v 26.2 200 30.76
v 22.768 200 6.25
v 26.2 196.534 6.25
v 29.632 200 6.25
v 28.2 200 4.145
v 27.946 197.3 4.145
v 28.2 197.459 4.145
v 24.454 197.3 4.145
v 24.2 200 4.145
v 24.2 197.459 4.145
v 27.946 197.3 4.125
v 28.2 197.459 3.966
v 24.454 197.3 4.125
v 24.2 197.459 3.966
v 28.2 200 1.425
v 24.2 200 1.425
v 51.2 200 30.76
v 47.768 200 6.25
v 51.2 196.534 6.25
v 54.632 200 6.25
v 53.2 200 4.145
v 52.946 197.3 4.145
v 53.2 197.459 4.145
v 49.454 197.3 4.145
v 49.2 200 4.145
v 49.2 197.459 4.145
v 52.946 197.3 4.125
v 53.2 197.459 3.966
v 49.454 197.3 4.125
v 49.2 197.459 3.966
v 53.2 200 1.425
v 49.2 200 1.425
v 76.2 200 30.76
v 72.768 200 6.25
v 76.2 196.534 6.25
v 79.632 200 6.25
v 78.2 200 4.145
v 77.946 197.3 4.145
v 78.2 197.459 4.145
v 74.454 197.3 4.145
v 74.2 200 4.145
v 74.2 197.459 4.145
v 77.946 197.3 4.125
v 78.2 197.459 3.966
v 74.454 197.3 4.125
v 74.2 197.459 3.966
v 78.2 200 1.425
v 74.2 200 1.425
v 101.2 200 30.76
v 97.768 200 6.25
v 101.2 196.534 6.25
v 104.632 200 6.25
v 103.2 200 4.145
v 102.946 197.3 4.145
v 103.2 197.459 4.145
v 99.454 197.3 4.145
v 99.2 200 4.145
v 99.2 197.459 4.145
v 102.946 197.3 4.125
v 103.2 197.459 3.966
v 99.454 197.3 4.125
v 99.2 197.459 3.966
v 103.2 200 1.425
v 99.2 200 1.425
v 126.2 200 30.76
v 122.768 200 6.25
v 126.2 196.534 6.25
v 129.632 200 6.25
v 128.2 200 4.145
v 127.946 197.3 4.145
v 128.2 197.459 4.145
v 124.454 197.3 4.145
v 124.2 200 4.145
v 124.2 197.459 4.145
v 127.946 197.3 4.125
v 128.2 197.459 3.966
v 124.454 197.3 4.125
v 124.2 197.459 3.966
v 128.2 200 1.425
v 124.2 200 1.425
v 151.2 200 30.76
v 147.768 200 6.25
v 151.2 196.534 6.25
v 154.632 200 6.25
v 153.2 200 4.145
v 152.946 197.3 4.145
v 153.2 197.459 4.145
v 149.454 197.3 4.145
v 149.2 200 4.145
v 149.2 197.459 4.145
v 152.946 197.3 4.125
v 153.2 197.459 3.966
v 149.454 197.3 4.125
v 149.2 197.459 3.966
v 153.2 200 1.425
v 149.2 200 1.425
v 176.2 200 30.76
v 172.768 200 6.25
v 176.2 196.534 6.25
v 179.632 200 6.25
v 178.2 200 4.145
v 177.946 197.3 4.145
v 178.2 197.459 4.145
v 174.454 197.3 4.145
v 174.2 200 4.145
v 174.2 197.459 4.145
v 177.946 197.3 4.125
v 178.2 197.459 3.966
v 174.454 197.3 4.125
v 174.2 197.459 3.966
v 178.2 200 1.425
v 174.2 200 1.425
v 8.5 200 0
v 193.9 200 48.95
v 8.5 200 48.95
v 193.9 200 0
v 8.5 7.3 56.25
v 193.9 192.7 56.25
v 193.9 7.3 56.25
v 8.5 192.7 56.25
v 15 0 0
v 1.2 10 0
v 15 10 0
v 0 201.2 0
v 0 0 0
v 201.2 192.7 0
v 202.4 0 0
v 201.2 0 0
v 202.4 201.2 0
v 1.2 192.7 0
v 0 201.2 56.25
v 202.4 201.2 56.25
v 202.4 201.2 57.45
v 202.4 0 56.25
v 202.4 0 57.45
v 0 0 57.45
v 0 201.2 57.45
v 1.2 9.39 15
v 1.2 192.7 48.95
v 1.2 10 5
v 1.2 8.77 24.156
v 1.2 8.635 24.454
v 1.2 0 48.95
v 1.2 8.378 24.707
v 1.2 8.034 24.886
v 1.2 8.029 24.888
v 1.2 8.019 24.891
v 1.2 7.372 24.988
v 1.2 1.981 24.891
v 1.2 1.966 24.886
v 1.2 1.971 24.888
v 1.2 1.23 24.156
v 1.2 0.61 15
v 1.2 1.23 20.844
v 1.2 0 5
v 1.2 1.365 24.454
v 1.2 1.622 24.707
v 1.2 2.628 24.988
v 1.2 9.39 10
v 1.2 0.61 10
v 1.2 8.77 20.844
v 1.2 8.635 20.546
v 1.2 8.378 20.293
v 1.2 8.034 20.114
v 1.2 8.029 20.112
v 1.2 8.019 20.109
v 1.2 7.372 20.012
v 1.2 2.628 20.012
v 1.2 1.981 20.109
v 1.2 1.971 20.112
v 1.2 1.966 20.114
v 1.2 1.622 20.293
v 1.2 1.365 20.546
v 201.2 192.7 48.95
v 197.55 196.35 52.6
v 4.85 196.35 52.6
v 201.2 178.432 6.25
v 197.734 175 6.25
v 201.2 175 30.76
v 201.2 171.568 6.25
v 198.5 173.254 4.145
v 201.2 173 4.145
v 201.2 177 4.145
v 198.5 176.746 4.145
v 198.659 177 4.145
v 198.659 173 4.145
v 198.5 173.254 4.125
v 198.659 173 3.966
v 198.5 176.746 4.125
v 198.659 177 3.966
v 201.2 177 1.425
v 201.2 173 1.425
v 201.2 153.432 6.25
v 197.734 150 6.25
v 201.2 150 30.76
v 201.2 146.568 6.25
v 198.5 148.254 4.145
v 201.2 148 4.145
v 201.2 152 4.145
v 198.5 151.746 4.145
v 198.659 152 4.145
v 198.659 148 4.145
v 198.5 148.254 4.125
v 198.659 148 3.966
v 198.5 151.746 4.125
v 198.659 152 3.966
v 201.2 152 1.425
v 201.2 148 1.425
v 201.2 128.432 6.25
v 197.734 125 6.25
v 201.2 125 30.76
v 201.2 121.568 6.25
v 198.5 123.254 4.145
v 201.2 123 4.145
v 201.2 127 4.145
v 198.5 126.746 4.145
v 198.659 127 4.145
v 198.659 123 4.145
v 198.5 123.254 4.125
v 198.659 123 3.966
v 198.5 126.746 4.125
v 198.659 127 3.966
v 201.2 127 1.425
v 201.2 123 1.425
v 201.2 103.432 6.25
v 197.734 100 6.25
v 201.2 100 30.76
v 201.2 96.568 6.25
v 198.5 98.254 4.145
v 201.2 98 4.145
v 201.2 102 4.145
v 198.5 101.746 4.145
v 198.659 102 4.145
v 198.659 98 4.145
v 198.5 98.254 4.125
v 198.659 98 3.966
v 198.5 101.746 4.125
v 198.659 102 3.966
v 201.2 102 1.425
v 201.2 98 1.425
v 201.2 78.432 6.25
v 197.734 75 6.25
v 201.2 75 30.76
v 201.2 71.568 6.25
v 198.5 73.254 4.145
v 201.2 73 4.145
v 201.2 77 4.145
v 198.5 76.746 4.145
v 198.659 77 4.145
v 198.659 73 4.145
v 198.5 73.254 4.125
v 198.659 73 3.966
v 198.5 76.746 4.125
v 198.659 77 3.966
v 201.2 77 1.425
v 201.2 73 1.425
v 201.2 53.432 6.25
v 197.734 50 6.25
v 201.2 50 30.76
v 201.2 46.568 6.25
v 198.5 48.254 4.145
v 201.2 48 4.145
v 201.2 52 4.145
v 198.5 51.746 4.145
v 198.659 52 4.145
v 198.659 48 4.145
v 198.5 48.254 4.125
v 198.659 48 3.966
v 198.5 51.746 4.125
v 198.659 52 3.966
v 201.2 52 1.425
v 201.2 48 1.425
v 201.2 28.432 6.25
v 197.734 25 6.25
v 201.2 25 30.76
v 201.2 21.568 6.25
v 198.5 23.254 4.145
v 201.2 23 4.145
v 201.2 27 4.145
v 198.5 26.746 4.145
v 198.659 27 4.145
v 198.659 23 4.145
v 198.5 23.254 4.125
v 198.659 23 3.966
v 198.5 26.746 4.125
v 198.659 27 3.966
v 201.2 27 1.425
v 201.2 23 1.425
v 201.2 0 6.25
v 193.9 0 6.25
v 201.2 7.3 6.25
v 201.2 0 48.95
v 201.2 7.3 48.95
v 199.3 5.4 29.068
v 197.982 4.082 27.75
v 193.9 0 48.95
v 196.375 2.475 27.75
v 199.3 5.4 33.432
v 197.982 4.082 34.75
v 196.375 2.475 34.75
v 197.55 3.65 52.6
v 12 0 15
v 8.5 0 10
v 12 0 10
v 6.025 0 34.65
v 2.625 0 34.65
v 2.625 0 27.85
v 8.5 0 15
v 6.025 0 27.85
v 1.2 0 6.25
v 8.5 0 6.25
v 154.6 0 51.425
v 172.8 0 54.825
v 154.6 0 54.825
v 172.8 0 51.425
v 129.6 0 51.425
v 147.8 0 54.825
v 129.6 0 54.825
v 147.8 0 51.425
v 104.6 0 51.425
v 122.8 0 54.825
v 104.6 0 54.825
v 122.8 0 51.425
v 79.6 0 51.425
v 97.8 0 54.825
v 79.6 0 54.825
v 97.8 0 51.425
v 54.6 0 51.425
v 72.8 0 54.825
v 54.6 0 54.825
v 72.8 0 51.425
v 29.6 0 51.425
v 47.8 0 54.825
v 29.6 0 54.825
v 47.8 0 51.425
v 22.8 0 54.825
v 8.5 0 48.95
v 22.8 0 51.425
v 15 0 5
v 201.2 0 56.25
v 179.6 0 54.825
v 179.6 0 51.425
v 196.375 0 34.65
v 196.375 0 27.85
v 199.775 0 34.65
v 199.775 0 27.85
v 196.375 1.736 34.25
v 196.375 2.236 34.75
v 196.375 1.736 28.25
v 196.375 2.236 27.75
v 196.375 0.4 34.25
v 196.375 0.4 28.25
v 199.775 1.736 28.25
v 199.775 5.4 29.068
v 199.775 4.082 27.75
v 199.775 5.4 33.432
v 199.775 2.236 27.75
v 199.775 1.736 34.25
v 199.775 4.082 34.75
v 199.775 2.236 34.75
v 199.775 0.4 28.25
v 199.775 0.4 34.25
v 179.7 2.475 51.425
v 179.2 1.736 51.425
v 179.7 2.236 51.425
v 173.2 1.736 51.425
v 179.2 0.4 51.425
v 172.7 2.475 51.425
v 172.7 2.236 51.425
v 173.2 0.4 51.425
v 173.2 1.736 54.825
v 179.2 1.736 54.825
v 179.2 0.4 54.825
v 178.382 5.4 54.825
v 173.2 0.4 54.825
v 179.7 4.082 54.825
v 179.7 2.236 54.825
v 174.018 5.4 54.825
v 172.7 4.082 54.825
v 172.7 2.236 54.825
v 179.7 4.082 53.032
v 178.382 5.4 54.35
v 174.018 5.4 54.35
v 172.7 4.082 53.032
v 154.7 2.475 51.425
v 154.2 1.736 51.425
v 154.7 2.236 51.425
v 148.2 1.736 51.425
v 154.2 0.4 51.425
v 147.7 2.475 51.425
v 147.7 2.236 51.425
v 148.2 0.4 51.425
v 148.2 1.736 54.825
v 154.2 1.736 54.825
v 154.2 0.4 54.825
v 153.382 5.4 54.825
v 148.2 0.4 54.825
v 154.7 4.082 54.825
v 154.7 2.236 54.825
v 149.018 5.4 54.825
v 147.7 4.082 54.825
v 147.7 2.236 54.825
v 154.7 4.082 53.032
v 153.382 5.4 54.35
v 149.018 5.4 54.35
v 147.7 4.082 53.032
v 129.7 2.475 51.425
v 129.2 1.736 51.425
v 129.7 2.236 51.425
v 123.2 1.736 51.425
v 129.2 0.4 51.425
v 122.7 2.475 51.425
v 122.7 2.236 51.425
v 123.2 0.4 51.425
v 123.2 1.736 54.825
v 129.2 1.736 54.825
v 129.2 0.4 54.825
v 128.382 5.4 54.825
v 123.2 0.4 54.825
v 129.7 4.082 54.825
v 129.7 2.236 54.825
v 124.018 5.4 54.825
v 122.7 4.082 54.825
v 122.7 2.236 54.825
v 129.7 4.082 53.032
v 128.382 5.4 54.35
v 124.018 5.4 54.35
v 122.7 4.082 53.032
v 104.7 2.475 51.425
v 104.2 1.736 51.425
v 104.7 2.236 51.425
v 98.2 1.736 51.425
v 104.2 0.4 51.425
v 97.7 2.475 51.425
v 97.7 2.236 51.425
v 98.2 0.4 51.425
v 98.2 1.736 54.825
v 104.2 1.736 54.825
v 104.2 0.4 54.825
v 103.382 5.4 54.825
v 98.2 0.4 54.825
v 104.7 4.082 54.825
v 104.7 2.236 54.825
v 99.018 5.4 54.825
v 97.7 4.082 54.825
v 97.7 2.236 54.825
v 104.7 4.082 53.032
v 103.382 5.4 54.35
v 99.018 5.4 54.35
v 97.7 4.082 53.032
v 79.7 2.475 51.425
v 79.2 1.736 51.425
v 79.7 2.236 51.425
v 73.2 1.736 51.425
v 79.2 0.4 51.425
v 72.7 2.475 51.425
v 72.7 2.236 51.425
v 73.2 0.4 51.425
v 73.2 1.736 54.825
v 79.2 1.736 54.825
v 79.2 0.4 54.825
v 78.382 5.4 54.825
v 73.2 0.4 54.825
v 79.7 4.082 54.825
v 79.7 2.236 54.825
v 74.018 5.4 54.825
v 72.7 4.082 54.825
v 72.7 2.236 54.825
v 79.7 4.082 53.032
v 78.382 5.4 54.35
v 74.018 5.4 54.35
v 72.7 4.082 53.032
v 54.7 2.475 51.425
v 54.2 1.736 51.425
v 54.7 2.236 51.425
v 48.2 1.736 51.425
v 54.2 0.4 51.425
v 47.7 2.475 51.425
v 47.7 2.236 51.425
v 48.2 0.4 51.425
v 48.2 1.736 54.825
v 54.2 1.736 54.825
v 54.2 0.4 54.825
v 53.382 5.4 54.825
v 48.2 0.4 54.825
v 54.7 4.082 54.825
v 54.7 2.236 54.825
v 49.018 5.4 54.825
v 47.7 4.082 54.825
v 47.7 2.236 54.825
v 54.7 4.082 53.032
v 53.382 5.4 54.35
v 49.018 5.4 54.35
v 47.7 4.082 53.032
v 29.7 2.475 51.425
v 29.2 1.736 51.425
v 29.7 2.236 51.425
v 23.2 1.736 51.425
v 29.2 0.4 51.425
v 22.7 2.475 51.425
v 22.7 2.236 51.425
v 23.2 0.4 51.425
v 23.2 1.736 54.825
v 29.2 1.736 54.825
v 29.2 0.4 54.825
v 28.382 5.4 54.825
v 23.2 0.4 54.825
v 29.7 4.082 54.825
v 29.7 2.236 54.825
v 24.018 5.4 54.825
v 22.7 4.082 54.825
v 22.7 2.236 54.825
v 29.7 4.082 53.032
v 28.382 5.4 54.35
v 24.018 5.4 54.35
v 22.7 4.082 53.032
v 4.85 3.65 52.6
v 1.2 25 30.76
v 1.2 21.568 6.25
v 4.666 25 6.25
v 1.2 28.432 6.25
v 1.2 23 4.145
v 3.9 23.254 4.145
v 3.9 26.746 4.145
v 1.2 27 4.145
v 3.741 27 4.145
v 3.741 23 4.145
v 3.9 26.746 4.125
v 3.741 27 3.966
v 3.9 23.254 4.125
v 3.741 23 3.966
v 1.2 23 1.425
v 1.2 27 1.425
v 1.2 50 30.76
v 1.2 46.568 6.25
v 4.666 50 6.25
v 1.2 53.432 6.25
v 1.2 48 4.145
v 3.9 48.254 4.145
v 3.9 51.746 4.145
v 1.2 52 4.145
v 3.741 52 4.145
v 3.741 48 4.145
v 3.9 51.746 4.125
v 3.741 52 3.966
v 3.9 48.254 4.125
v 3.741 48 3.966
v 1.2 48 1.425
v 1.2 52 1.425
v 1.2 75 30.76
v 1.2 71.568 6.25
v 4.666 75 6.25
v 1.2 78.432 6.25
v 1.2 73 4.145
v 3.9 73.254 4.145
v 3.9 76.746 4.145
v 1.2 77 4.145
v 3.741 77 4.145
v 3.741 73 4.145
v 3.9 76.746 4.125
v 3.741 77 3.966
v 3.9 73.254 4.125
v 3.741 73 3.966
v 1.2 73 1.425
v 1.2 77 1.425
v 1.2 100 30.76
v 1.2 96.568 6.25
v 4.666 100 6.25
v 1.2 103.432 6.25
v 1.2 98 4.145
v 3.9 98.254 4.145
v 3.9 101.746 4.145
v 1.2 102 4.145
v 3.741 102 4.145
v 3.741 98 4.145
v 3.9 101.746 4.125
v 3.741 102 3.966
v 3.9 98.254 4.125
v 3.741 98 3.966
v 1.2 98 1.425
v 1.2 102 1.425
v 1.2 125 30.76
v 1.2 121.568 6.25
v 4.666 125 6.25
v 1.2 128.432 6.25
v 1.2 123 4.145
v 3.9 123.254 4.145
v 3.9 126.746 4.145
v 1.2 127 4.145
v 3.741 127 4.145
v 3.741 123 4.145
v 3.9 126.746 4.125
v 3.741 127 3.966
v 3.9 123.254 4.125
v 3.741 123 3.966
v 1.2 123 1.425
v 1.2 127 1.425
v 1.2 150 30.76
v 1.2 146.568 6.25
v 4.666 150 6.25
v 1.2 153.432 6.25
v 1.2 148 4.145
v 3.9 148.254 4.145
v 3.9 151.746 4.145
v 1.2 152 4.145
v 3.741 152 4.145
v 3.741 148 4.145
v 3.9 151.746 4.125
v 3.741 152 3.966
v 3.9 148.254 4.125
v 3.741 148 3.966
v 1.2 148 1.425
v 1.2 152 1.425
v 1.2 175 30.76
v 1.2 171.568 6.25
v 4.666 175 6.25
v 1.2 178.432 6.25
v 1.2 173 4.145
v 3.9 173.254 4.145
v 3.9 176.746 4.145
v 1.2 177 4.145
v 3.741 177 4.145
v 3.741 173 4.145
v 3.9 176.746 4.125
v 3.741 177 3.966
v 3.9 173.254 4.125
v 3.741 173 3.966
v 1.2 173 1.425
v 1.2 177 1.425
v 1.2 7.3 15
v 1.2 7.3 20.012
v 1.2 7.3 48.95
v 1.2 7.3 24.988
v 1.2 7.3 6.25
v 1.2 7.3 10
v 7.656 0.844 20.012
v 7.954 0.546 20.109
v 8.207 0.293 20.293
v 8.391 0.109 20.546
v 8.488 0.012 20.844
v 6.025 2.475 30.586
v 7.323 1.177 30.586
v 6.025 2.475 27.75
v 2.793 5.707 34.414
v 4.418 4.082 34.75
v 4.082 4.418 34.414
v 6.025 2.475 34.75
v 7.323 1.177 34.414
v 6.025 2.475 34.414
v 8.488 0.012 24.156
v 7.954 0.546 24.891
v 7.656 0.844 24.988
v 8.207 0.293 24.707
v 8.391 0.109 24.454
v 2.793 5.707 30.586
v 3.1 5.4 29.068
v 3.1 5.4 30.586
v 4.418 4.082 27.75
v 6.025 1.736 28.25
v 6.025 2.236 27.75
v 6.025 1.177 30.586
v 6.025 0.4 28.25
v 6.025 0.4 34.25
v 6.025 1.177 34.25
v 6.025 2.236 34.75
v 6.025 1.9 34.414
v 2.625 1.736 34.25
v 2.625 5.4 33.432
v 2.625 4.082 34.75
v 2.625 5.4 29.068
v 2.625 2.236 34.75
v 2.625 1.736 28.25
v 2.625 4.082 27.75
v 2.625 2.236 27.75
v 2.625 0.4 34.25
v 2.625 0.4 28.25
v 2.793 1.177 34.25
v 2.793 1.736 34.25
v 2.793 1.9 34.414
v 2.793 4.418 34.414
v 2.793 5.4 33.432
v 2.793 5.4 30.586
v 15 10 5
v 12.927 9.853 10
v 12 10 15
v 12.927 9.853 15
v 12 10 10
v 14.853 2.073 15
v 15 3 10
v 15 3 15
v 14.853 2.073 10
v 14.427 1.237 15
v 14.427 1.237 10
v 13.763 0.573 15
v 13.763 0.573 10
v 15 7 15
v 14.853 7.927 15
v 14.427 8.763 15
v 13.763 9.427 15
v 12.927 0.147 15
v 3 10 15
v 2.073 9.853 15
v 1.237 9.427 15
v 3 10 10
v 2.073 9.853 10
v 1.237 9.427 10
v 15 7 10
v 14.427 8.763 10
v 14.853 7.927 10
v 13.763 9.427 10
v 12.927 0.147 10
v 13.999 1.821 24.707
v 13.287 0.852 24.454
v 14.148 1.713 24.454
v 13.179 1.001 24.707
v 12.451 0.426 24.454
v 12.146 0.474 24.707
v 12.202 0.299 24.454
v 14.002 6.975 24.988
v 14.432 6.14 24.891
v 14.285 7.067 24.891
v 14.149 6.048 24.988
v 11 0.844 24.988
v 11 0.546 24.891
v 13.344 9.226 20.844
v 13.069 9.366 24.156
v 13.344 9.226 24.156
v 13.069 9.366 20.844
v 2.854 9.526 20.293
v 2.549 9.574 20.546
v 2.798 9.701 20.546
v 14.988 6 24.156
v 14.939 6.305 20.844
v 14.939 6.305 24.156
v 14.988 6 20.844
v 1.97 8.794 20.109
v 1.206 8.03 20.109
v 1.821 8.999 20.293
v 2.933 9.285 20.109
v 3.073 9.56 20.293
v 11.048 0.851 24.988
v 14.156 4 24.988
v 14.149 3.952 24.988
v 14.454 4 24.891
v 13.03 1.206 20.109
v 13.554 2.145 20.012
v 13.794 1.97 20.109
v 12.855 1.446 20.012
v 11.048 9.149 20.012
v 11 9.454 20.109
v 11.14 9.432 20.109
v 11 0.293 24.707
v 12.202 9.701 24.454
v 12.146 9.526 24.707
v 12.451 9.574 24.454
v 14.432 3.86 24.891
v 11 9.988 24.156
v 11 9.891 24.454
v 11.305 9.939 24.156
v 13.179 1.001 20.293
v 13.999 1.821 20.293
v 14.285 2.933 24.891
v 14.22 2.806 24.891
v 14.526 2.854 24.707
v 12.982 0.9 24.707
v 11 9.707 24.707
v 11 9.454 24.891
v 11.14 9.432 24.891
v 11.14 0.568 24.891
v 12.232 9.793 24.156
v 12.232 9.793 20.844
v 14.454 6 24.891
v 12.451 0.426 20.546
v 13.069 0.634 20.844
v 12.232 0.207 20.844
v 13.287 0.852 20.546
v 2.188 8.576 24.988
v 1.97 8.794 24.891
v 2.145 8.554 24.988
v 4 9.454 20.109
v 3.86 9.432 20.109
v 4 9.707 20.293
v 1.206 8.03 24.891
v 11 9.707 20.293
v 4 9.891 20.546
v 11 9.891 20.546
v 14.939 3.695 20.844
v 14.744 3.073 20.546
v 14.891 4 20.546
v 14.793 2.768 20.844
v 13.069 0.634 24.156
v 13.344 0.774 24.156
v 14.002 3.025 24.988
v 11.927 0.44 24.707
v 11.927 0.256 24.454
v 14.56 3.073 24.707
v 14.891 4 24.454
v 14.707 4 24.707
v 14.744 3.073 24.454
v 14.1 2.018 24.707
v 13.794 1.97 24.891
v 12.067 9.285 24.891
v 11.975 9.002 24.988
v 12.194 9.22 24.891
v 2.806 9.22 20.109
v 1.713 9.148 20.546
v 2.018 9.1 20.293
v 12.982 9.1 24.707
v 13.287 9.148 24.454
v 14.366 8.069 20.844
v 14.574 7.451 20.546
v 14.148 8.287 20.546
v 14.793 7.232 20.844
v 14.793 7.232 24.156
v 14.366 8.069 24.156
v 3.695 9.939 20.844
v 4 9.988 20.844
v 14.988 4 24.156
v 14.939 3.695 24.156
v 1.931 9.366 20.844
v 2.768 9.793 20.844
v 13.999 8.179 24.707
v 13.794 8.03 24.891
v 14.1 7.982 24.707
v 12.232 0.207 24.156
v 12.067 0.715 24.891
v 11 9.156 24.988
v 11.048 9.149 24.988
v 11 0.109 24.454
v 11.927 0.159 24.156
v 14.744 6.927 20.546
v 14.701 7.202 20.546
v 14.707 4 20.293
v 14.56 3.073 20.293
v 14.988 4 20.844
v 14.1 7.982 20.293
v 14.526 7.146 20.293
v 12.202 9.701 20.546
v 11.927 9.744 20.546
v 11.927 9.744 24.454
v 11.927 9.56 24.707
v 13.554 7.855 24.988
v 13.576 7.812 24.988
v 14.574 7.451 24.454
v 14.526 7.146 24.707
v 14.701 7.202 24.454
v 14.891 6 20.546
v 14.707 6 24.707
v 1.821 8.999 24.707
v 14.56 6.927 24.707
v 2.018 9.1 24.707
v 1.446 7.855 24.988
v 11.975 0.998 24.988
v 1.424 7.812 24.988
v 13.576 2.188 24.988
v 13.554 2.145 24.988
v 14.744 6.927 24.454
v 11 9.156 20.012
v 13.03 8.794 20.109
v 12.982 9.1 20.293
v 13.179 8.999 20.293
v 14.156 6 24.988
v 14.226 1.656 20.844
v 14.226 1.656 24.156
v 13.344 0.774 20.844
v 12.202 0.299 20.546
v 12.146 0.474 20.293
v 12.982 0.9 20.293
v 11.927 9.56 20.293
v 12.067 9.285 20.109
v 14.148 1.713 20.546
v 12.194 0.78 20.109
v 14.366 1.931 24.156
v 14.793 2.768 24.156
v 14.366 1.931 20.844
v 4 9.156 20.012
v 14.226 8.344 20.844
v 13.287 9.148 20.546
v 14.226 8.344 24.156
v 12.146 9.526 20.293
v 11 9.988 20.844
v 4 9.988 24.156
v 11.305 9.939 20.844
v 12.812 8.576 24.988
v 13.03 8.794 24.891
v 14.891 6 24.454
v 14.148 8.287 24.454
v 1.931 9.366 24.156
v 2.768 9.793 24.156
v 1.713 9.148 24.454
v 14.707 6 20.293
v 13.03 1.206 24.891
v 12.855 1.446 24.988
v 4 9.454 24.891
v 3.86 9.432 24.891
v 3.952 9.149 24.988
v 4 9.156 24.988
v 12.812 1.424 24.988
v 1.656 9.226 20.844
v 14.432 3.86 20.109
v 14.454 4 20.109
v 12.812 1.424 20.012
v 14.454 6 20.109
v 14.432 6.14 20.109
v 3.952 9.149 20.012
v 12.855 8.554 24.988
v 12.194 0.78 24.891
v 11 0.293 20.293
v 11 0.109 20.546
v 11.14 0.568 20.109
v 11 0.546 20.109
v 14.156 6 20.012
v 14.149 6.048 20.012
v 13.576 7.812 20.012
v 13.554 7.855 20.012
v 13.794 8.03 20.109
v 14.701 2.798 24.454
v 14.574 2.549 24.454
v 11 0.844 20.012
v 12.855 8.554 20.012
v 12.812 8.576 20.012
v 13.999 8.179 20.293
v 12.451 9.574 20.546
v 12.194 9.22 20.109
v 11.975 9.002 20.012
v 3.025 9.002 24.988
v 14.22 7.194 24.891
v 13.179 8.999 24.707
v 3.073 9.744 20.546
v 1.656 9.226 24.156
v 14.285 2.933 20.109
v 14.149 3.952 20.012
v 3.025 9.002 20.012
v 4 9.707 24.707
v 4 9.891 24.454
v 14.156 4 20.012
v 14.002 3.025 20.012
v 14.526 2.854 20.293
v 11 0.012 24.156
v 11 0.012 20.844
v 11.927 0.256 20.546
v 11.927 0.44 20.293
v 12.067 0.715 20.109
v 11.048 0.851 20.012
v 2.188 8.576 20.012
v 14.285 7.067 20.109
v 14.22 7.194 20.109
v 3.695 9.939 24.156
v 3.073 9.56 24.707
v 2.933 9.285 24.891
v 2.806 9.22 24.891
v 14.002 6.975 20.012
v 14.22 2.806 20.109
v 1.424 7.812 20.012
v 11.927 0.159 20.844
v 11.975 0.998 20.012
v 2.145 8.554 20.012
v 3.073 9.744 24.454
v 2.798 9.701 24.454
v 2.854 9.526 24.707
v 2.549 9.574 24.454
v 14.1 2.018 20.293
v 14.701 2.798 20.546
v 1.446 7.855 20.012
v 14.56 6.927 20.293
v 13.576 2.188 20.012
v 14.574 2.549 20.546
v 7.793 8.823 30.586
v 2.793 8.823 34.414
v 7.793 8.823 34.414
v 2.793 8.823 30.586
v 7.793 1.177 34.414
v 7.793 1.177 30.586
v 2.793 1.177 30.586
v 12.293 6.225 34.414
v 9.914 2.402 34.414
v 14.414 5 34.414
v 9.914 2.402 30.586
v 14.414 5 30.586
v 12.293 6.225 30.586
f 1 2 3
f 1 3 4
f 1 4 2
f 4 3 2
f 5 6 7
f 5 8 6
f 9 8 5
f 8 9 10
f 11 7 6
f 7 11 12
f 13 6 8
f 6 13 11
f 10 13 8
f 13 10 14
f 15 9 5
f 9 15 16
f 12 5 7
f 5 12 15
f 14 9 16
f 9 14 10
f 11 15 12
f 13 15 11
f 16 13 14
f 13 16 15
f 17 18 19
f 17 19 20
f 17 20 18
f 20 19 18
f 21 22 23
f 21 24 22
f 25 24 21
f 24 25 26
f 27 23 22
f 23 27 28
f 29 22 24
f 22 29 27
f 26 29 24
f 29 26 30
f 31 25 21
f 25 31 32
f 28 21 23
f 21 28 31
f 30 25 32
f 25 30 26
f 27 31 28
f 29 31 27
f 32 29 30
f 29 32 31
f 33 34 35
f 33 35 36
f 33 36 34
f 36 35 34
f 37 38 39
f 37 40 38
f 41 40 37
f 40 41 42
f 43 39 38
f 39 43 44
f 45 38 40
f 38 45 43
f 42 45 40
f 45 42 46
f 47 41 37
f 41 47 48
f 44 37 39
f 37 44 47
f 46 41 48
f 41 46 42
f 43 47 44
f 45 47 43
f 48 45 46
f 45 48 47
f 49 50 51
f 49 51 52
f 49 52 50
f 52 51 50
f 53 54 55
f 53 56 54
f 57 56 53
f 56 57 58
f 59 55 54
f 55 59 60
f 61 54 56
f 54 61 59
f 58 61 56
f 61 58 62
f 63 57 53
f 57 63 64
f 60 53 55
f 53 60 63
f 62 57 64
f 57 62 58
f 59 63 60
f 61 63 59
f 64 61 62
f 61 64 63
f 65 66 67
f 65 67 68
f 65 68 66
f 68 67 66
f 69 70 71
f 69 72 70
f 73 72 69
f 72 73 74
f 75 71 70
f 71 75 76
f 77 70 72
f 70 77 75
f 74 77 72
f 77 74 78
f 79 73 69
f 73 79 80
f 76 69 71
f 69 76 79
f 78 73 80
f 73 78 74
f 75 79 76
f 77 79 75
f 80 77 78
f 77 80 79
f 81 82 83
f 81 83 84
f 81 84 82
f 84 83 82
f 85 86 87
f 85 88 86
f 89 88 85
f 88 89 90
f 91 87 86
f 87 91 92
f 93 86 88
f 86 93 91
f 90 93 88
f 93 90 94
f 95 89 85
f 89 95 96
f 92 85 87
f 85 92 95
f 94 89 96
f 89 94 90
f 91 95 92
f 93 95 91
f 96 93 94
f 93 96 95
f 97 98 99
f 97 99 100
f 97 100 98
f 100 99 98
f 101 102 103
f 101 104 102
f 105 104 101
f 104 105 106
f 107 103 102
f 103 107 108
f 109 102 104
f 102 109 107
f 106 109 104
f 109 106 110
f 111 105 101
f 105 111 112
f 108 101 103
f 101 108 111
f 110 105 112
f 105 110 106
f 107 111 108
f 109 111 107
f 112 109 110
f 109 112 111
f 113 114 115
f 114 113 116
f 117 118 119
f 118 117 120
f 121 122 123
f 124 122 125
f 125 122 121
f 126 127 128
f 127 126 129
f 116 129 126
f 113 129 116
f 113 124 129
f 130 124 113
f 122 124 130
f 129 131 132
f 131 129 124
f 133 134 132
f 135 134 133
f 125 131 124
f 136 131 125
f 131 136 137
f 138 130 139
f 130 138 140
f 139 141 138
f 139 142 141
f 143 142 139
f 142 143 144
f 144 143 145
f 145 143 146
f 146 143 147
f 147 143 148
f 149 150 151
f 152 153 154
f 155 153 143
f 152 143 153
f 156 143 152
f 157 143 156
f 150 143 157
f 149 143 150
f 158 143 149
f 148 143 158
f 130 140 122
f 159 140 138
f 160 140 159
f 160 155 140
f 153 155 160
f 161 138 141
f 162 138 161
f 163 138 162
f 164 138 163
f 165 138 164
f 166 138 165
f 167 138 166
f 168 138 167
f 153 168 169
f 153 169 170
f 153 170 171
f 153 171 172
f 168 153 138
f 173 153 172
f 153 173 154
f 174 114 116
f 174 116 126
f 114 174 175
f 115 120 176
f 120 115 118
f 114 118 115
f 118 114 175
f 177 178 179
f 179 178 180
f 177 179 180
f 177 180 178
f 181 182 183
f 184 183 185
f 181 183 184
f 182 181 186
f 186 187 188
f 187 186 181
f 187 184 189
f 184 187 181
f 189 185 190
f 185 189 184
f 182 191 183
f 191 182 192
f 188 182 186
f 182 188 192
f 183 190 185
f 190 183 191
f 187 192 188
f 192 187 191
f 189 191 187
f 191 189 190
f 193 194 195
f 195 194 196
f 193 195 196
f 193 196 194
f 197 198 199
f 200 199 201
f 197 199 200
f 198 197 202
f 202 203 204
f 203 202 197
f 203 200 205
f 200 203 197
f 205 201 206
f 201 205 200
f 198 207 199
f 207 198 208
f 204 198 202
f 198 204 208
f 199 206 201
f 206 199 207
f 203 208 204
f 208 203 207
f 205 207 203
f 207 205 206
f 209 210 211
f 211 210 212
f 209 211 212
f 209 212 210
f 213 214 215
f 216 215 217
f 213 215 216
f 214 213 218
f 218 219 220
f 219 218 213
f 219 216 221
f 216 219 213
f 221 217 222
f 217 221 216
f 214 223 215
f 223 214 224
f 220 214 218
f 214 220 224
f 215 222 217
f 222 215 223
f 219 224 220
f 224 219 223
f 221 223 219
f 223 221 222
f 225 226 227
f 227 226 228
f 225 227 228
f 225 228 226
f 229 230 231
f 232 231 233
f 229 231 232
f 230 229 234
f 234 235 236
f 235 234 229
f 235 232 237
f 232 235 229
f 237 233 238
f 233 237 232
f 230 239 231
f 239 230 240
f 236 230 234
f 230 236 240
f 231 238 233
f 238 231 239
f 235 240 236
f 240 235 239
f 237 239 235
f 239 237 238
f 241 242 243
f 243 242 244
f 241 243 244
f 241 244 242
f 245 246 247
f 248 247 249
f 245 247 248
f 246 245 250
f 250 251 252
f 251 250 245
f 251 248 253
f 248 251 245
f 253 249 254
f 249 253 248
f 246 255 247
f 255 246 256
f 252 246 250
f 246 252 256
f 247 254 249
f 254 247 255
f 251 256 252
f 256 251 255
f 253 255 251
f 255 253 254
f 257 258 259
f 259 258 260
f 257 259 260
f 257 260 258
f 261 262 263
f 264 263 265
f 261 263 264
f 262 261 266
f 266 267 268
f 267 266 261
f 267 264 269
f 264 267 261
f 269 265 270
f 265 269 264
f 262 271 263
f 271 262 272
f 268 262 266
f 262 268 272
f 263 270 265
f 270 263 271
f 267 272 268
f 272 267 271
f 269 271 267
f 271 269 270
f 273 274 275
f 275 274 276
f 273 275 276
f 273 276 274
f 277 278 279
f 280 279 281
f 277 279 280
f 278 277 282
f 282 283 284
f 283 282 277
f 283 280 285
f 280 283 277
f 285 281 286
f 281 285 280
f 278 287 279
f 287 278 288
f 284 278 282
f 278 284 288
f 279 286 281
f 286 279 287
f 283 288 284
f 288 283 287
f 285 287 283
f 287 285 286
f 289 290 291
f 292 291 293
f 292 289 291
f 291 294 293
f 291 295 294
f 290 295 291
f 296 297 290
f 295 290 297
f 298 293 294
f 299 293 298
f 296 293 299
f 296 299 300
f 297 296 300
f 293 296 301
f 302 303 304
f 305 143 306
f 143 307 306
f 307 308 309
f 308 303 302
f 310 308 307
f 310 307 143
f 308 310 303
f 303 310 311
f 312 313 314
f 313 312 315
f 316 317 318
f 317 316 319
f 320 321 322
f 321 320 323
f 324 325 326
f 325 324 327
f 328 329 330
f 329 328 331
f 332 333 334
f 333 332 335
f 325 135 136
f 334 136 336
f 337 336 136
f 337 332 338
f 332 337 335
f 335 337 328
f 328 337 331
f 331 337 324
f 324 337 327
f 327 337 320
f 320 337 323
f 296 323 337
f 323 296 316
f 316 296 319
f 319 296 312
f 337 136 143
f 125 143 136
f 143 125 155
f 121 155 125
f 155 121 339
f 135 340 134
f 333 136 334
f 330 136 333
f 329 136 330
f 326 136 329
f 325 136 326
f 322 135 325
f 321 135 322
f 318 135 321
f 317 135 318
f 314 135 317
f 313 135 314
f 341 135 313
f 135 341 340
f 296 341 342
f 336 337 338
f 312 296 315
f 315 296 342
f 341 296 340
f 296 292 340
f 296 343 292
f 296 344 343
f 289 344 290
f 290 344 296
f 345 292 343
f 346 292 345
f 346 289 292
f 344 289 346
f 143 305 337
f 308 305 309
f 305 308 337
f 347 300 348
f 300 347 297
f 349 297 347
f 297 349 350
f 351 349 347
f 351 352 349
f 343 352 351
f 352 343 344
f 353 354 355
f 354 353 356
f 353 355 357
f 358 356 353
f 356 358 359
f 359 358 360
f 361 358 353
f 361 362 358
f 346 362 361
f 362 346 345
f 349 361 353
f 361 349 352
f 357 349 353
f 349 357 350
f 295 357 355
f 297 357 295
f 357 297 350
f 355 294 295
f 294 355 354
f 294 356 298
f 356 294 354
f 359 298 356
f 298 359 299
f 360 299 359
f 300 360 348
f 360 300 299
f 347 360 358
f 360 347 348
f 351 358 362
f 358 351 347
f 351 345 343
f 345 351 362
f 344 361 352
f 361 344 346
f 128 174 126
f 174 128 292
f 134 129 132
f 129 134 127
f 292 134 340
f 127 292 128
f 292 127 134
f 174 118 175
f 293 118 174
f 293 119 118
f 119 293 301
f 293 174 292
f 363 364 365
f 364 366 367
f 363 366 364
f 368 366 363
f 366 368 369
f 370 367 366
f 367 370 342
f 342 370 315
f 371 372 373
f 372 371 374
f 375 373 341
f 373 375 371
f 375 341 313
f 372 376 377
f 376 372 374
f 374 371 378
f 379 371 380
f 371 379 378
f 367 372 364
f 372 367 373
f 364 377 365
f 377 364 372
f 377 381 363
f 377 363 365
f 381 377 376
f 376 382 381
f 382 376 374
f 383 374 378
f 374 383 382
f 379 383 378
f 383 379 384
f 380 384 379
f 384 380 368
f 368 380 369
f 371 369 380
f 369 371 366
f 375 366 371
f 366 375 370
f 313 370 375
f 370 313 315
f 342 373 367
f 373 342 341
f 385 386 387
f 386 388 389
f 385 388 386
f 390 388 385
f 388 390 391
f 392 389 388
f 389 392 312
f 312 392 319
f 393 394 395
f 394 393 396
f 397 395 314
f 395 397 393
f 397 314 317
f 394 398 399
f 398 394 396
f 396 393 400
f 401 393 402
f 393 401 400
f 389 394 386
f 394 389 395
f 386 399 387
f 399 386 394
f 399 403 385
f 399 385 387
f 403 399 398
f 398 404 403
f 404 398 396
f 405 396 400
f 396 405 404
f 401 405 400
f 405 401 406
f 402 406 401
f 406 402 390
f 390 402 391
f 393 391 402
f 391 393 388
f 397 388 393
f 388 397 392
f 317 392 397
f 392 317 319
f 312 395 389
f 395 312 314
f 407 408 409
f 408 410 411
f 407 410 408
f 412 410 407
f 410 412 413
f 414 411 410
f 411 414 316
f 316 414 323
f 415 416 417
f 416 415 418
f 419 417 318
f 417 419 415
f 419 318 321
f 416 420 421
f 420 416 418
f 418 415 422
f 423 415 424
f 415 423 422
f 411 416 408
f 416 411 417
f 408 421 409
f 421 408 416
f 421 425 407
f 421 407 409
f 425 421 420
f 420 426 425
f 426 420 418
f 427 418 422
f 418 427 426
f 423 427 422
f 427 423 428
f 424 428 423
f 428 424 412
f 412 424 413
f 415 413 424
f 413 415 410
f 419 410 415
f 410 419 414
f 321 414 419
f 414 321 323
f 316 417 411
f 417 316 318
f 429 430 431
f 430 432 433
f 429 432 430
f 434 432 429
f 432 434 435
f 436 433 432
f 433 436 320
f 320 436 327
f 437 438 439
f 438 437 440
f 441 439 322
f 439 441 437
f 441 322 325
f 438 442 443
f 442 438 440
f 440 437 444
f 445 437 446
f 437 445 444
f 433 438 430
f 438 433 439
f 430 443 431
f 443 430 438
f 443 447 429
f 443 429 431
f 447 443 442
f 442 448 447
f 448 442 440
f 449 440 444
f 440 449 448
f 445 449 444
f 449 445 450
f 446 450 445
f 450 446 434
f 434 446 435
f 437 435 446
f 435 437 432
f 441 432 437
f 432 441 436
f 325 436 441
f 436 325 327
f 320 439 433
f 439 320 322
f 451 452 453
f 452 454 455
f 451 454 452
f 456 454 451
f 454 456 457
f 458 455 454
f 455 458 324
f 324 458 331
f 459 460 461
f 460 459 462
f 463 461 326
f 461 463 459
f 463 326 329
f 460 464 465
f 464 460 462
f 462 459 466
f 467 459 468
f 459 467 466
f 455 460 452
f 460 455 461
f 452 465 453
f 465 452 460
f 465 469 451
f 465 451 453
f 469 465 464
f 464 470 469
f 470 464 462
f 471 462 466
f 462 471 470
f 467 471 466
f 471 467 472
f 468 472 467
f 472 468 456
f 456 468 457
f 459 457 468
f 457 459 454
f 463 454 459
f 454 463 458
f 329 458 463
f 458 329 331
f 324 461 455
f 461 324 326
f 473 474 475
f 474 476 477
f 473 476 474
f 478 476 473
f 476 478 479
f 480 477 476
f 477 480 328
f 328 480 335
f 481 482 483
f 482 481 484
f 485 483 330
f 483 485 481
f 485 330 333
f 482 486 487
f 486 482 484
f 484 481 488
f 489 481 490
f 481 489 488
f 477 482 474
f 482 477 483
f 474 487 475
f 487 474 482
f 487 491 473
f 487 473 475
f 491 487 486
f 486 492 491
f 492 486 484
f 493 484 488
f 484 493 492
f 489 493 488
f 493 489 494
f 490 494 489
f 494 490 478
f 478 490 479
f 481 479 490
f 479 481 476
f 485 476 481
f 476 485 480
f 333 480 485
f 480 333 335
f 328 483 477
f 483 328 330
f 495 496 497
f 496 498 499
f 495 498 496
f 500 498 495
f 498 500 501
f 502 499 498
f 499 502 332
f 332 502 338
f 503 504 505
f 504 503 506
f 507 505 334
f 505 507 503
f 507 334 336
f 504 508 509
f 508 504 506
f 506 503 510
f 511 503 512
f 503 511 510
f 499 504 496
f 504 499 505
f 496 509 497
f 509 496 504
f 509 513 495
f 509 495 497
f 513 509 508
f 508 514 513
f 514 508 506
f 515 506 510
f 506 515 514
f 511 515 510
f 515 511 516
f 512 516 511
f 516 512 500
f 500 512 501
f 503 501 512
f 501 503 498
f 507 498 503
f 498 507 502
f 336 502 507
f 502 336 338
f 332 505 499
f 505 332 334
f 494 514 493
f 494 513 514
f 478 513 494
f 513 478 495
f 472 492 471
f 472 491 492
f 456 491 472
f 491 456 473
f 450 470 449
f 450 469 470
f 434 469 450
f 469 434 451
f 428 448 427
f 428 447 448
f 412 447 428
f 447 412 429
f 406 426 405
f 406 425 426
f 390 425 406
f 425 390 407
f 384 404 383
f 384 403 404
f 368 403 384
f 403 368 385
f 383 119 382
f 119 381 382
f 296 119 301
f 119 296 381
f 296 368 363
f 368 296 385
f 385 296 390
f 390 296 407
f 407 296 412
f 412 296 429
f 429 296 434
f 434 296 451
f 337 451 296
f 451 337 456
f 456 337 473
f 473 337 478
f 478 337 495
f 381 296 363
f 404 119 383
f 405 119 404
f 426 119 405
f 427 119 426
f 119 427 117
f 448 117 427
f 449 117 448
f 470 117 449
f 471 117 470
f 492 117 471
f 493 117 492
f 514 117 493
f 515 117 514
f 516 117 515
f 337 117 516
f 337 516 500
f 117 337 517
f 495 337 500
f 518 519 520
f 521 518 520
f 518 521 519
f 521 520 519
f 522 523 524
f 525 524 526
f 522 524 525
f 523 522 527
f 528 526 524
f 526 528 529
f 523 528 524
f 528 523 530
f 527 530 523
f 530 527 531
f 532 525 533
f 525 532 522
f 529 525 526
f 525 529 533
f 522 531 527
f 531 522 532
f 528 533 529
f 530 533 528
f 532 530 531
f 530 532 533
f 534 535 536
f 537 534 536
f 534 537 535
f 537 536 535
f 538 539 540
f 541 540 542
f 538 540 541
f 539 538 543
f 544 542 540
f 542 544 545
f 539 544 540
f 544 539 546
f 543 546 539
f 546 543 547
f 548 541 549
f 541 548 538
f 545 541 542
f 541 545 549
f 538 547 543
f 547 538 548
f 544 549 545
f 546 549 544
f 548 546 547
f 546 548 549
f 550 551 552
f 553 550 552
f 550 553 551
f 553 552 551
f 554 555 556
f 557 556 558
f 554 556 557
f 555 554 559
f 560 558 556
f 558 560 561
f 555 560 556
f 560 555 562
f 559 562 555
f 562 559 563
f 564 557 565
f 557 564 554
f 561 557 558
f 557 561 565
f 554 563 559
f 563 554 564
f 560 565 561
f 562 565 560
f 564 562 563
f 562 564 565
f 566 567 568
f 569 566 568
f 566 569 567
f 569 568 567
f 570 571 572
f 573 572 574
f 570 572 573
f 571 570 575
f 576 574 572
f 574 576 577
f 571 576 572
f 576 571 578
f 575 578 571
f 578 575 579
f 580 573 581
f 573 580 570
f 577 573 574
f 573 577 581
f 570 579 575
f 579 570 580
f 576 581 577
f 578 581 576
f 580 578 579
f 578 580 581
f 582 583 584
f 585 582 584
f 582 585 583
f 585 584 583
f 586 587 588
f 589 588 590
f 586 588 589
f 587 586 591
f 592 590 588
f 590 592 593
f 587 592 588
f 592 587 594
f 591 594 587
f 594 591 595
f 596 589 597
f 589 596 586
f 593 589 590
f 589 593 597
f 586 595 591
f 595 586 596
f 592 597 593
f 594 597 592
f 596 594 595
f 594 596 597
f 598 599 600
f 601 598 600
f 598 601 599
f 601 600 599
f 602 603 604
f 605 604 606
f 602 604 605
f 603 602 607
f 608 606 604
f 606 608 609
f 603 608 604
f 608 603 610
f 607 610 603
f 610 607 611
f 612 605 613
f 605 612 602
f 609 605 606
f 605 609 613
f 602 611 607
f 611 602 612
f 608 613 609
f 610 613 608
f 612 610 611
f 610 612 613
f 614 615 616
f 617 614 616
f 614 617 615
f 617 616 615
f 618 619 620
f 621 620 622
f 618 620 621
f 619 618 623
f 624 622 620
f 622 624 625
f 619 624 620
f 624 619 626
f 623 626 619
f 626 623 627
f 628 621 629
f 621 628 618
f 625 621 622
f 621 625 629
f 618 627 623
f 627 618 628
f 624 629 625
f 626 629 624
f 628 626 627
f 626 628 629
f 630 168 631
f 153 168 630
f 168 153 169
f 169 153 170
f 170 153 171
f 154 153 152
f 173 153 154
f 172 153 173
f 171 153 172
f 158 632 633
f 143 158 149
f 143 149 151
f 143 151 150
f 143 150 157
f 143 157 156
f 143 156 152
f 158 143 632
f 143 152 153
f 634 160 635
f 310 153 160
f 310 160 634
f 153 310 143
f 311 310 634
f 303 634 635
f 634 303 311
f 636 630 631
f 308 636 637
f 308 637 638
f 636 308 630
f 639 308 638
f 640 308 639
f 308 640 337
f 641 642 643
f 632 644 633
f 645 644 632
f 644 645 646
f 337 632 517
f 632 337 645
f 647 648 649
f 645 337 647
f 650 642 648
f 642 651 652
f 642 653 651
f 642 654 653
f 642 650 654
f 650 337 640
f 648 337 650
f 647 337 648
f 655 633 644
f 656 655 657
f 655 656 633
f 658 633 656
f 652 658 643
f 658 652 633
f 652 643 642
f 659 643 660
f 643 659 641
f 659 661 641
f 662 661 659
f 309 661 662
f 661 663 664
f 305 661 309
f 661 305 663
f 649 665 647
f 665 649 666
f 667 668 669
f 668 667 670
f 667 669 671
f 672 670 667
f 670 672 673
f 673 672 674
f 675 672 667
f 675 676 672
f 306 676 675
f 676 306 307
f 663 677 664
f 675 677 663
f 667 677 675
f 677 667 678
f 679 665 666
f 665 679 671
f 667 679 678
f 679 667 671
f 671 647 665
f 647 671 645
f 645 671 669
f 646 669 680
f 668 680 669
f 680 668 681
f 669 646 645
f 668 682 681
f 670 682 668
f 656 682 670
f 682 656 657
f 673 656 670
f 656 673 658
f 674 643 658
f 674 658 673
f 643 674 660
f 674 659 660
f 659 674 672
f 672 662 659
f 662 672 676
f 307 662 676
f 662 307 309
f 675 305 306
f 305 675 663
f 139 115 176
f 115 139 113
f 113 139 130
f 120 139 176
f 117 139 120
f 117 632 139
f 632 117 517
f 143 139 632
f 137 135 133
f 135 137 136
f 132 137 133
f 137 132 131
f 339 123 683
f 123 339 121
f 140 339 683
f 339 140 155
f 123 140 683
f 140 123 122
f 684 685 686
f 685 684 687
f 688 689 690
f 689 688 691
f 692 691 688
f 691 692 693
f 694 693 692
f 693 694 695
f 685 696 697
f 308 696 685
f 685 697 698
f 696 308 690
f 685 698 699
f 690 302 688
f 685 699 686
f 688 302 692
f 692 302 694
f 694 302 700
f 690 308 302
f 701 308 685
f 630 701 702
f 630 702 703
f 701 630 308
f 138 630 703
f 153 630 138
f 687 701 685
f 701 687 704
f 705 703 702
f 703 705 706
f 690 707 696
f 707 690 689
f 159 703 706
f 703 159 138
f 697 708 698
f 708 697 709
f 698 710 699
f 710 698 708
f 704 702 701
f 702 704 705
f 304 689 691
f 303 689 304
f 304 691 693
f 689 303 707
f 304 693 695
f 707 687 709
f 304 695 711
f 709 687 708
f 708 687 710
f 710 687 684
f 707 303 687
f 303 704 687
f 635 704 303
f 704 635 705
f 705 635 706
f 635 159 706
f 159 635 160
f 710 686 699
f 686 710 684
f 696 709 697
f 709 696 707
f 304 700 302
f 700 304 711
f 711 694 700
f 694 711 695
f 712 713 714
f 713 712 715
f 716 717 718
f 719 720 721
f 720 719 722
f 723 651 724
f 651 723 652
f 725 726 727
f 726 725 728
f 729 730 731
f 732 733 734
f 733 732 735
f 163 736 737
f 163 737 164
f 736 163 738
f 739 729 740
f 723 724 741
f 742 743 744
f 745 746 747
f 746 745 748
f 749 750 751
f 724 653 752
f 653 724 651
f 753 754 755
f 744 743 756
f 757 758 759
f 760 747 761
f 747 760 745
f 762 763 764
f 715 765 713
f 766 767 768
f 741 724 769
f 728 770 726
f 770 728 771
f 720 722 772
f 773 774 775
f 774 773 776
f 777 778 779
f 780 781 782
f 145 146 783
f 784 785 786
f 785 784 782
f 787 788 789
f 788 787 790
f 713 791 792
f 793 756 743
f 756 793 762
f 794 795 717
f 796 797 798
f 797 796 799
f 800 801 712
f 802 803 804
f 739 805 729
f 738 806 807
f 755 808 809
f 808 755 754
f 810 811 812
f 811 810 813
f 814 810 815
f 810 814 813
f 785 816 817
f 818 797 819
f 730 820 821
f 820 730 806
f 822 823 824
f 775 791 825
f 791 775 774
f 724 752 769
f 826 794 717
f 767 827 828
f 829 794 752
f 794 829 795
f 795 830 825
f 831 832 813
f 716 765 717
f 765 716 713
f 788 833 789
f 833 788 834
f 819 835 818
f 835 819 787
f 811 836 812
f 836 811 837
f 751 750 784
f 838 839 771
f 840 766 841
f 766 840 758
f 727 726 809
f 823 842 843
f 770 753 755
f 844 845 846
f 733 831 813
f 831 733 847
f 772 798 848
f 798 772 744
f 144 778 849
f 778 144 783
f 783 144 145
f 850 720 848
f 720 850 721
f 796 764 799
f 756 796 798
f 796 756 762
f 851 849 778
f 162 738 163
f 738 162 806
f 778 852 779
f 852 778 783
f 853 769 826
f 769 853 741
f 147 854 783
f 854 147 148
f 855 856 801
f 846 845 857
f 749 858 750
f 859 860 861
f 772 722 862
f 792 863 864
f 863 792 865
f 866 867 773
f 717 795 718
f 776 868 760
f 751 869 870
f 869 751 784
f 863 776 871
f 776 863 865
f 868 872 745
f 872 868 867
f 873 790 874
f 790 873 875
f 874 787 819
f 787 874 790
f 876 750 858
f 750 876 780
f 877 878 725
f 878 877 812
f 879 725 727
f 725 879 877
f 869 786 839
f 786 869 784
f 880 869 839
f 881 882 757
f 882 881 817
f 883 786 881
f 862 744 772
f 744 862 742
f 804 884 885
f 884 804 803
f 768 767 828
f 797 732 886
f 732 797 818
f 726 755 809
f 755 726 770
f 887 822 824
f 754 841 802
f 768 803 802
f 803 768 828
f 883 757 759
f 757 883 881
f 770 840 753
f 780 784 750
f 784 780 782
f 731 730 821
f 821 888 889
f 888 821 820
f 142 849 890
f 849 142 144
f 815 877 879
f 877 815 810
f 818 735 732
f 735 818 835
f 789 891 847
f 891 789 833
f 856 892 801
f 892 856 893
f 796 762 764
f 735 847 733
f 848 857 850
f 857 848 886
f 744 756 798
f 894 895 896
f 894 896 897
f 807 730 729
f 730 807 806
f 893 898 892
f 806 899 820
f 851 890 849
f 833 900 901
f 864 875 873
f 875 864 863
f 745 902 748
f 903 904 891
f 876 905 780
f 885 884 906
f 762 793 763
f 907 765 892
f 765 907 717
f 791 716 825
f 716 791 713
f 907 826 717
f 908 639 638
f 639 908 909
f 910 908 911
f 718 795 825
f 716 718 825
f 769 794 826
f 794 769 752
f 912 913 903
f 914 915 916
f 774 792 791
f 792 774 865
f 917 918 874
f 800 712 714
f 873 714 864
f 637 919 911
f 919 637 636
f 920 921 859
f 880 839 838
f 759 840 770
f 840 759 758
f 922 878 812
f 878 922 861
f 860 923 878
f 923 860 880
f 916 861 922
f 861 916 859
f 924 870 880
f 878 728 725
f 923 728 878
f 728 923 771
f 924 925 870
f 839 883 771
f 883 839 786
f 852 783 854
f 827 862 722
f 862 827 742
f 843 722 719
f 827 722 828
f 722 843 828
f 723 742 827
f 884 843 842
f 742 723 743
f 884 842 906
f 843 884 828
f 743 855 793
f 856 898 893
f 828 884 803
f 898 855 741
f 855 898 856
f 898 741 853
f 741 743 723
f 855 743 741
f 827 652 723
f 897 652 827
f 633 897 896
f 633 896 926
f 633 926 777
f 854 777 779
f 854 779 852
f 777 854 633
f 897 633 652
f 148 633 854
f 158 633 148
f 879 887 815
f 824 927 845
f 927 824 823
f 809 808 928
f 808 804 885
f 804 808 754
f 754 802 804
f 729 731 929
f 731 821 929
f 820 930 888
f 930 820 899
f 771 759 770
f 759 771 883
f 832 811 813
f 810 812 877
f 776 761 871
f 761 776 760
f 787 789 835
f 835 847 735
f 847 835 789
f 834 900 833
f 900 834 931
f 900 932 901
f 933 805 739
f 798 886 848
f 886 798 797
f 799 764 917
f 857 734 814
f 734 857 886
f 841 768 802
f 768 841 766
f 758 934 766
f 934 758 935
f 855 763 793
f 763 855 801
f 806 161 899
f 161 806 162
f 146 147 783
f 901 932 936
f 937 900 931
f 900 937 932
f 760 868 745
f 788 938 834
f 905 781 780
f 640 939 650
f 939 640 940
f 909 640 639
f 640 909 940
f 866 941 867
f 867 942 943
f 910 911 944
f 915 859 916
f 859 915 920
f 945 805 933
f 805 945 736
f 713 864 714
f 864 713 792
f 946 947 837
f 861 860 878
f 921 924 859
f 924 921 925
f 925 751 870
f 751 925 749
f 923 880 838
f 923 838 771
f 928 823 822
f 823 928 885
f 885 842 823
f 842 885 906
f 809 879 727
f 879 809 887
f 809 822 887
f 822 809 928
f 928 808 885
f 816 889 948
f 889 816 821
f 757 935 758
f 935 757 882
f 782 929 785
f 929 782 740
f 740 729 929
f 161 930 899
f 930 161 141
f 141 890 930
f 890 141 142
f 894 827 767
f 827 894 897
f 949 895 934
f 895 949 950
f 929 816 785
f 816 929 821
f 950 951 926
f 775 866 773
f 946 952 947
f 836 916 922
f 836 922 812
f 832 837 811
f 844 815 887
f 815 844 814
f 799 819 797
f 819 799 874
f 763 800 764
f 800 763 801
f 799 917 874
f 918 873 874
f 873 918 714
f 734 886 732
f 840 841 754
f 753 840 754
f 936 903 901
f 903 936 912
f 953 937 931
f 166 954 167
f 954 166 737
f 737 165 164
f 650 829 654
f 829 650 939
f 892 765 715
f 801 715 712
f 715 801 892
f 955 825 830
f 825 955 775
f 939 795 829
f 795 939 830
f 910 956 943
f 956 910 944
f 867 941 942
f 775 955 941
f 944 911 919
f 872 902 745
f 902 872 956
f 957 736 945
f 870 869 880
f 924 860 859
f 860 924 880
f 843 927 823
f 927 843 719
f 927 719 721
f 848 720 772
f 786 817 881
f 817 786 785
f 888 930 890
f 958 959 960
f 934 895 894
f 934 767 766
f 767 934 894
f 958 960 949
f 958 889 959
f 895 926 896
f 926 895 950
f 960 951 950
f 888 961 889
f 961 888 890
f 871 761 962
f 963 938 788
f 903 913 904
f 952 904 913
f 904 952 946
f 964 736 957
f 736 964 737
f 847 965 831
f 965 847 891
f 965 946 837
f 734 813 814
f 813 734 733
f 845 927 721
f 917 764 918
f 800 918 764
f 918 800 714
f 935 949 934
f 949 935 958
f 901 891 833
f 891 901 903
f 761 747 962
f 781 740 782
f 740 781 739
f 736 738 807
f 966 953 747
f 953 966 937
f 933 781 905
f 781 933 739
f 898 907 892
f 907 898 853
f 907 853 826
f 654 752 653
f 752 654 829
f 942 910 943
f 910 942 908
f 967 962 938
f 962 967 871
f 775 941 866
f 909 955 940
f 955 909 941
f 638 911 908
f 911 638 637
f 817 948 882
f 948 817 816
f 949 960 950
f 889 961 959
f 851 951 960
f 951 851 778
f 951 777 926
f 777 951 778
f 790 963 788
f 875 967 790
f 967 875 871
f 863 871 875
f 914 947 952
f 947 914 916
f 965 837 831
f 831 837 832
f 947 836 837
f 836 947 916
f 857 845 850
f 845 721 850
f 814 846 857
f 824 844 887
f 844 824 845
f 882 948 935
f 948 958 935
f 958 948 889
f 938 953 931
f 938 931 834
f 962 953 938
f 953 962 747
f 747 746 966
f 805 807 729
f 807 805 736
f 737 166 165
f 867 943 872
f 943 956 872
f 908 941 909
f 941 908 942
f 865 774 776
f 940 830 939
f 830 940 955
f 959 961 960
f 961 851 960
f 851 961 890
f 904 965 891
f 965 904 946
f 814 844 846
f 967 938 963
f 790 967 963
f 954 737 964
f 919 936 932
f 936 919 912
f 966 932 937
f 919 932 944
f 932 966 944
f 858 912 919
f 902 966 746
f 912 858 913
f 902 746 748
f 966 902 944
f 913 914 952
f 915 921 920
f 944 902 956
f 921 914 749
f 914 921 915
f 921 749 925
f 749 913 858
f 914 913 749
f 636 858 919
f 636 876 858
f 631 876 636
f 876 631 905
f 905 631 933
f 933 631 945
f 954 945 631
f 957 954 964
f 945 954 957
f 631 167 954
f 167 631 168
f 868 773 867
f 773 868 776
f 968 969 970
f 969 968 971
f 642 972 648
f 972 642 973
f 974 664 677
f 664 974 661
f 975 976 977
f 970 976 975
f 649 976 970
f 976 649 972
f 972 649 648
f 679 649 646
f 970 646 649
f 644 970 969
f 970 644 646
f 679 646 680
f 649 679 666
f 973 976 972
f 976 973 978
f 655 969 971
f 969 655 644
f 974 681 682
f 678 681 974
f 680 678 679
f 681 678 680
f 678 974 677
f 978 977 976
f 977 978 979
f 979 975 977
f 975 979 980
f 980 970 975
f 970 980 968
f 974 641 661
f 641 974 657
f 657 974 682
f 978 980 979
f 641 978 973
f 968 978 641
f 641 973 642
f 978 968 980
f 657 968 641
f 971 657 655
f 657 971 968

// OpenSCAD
// file: BOSL2/rounding.scad
// A cube with the x-y corners rounded by 'corner' radius.
// Still fits inside a 'size' cube
module round(size, corner, $fn = $fn, $fa = $fa, center=false) {
  translation = (center ? [-size[0]/2, -size[1]/2, -size[2]/2]: [0,0,0]);
  translate(translation)
    hull() {
      for (x = [corner, size[0] - corner]) {
        for (y = [corner, size[1] - corner]) {
          translate([x, y, 0])
            cylinder(r=corner, h=size[2], $fn = $fn, $fa = $fa);
        }
      }
    }
}
// Makes a cube with the x-y corners rounded by 'corner' radius
// and all edges chamfered by 'chamfer' radius. Still fits inside
// a 'size' cube.
module doubleround(size, corner, chamfer, $fn1 = $fn, $fn2 = $fn, center=false)
{
  translation = (center ? [-size[0]/2, -size[1]/2, -size[2]/2]: [0,0,0]);
  translate(translation)
    minkowski(){
      translate([chamfer, chamfer, chamfer])
        round([size[0]-2*chamfer, size[1]-2*chamfer, size[2]-2*chamfer], corner, $fn = $fn1);
      sphere(r=chamfer, $fn = $fn2);
    }
}


cube([15, 10, 5]);
translate([0,0,10])
    round([15, 10, 5], 3, $fn = 20);
translate([0,0,20])
    doubleround([15,10,5], 3, 1, $fn1 = 20, $fn2 = 20);
translate([0,0,30])
    doubleround([15,10,5], 3, 2, $fn1 = 1, $fn2 = 1);
// file: BOSL2/std.scad
// Minimal BOSL2 compatibility shim for bundled gallery models.
// It implements only the helpers used by the imported OpenSCAD projects.

CENTER = [0, 0, 0];
BOTTOM = [0, 0, -1];
TOP = [0, 0, 1];
LEFT = [-1, 0, 0];
RIGHT = [1, 0, 0];
FRONT = [0, -1, 0];
BACK = [0, 1, 0];

module up(z=0) {
    translate([0, 0, z]) children();
}

module down(z=0) {
    translate([0, 0, -z]) children();
}

module attach(anchor=CENTER) {
    children();
}

module cuboid(size=[1, 1, 1], anchor=CENTER) {
    center = anchor == CENTER;
    translate(center ? [0, 0, 0] : [0, 0, size[2] / 2])
        cube(size, center=true);
    children();
}

module xcyl(h=1, r=1, anchor=CENTER) {
    center = anchor == CENTER;
    translate(center ? [0, 0, 0] : [h / 2, 0, 0])
        rotate([0, 90, 0])
            cylinder(h=h, r=r, center=true);
}
// main file
include <BOSL2/std.scad>
include <BOSL2/walls.scad>

// change what you need here
// walls open/closed
top_wall_closed=true;
left_wall_closed=true;
right_wall_closed=true;
bottom_wall_closed=false;

// walls and lid hex
top_wall_hex=false;
left_wall_hex=false;
right_wall_hex=false;
bottom_wall_hex=false;
lid_hex=false;

// grid and box size
size_x=8;
size_y=8;
height=50;

// wall thickness
wall_width=1.2;

// changing the hex layout
hex_strut=1.2;
hex_spacing=5;

// END customizable part

// change these if you know what you're doing
multiboard_height=6.25;
multiboard_gridsize=25;

width=multiboard_gridsize*size_x;
depth=multiboard_gridsize*size_y;

tooth_depth=5;
tooth_height=height*0.5;

clipnose_width=7;
clipnose_height=3.4;
clipnose_offset=(multiboard_height-clipnose_height)/2;

triangle_side_length=7.3;

if(tooth_height < 20) {
    tooth_height=sqrt(tooth_depth^2+height^2);
}

module connector_port() {
    translate([0,clipnose_height,clipnose_width]) rotate([0,90,-90]) translate([0.1,0,0]) linear_extrude(3.4)
      polygon(
          points=[
            [0,0],
            [0.4,0.4],
            [0.4,1.736],
            [-0.1,2.236],
            [-0.1,4.082],
            [1.218,5.4],
            [5.582,5.4],
            [6.9,4.082],
            [6.9,2.236],
            [6.4,1.736],
            [6.4,0.4],
            [6.8,0]
          ], 
          paths=[[0,1,2,3,4,5,6,7,8,9,10,11]]
        );
}

module connector() {
    difference () {
        translate([0,(5*.8)/2,0]) rotate([90,0,0]) scale([.5,.8,.8]) translate([0,0,-1]) difference() {
            connector_port();
            cube([7,5,1]);
            translate([0,0,6]) cube([7,5,1]);
        }
        translate([0,-3.5,0]) rotate([0,45,0]) cube([7,7,7]);
    }
}

module triangle(length, side_length=triangle_side_length, clips=false) {
  difference() {
      linear_extrude(length)
        polygon(points=[[0,0],[side_length,0],[0,side_length]], paths=[[0,1,2]]);
        
      if (clips) {
          clipnose_count=floor(length/25)-1;
          for ( i = [1 :  clipnose_count]) {
              translate([0,clipnose_offset,(i*25)-(clipnose_width/2)]) connector_port();
          }
      }
  }
}

module tooth() {
    diagonal=tooth_depth*sqrt(2);
    trans_C=(diagonal)/2;
    tooth_rotation=atan(trans_C/tooth_height);
    trans_A=trans_C*sin(tooth_rotation);
    trans_B=sqrt(trans_C^2+trans_A^2);
    trans_x=trans_B;
    trans_z=trans_A;
    translate([trans_C,trans_C,0]) rotate([0,0,180]) difference() {
      translate([trans_x,0,-trans_z]) rotate([0,tooth_rotation,0]) rotate([0,0,45]) cube([tooth_depth,tooth_depth,tooth_height]);
      
      translate([trans_C, 0, -width]) cube([width*2,width*2,width*2]);
      translate([-width, -width, -width*2]) cube([width*2,width*2,width*2]);
    }
}

module wall(width_param, left_wall=true, right_wall=true, hex_wall=false) {
    width = width_param 
      + (left_wall ? wall_width : 0) 
      + (right_wall ? wall_width : 0);

    if(hex_wall==true) {
        translate([wall_width/2,width/2,(height+multiboard_height)/2]) rotate([90,0,90]) hex_panel([width,height+multiboard_height,wall_width], hex_strut, hex_spacing);
    } else {
        cube([wall_width,width,height+multiboard_height]);
    }
    
    tooth_count=floor(width_param/25)-1;
    for ( i = [1 : tooth_count]) {
        tooth_offset=(left_wall ? wall_width : 0)+multiboard_gridsize*i;
        translate([wall_width,tooth_offset,0]) {
            translate([0,0,multiboard_height]) tooth();
            translate([0,0,clipnose_offset]) connector();
        }
    }
    
    if(left_wall==true) {
      translate([wall_width,wall_width,0]) triangle(height+multiboard_height,triangle_side_length);
    } else {
      translate([wall_width,0,height+multiboard_height]) rotate([0,180,-90]) triangle(height, triangle_side_length, true);
    }
    
    if(right_wall==true) {
        translate([wall_width,width-wall_width,0]) rotate([0,0,-90]) triangle(height+multiboard_height, triangle_side_length);
    } else {
        translate([wall_width,width,multiboard_height]) rotate([0,0,-90]) triangle(height, triangle_side_length,true);
    }
    
    translate([wall_width,0,height+multiboard_height]) rotate([-90,0,0]) triangle(width, triangle_side_length);
}

module box(walls=[true,true,true,true],hex_walls=[false,false,false,false], hex_top=false) {
    union() {
        if(walls[0]==true) {
            translate([0,width+wall_width+(walls[2]?wall_width:0),0]) rotate([0,0,-90]) wall(depth,walls[3],walls[1],hex_walls[0]);
        } else {
            translate([(walls[3]?wall_width:0),width+(walls[2]?wall_width:0),height+multiboard_height]) rotate([-90,0,-90]) triangle(depth, triangle_side_length, true);
        }
        if(walls[1]==true) {
            translate([depth+wall_width+(walls[3]?wall_width:0),width+(walls[0]?wall_width:0)+(walls[2]?wall_width:0),0]) rotate([0,0,180]) wall(width,walls[0],walls[2],hex_walls[1]);
        } else {
            translate([depth+(walls[3]?wall_width:0),width+(walls[2]?wall_width:0),height+multiboard_height]) rotate([-90,0,180]) triangle(depth, triangle_side_length, true);
        }
        if(walls[2]==true) {
            translate([depth+(walls[3]?wall_width:0)+(walls[1]?wall_width:0),0,0]) rotate([0,0,90]) wall(depth,walls[1],walls[3],hex_walls[2]);
        } else {
            translate([depth+(walls[3]?wall_width:0),0,height+multiboard_height]) rotate([-90,0,90]) triangle(depth, triangle_side_length, true);
        }
        if(walls[3]==true) {
            wall(width,walls[2],walls[0],hex_walls[3]);
        } else {
            translate([0,(walls[2]?wall_width:0),height+multiboard_height]) rotate([-90,0,0]) triangle(depth, triangle_side_length, true);
        }
        
        top_width=width+(walls[1] ? wall_width : 0)+(walls[3] ? wall_width : 0);
        top_depth=depth+(walls[0] ? wall_width : 0)+(walls[2] ? wall_width : 0);
        if(hex_top==true) {
            translate([width/2,depth/2,height+multiboard_height]) hex_panel([width+wall_width*2,depth+wall_width*2,wall_width], hex_strut, hex_spacing);
        } else {
            translate([0,0,height+multiboard_height]) cube([top_width,top_depth,wall_width]);
        }
    }
}

box(
  [
    top_wall_closed,
    right_wall_closed,
    bottom_wall_closed,
    left_wall_closed
  ],
  [
    top_wall_hex,
    right_wall_hex,
    bottom_wall_hex,
    left_wall_hex
  ],
  lid_hex
);
